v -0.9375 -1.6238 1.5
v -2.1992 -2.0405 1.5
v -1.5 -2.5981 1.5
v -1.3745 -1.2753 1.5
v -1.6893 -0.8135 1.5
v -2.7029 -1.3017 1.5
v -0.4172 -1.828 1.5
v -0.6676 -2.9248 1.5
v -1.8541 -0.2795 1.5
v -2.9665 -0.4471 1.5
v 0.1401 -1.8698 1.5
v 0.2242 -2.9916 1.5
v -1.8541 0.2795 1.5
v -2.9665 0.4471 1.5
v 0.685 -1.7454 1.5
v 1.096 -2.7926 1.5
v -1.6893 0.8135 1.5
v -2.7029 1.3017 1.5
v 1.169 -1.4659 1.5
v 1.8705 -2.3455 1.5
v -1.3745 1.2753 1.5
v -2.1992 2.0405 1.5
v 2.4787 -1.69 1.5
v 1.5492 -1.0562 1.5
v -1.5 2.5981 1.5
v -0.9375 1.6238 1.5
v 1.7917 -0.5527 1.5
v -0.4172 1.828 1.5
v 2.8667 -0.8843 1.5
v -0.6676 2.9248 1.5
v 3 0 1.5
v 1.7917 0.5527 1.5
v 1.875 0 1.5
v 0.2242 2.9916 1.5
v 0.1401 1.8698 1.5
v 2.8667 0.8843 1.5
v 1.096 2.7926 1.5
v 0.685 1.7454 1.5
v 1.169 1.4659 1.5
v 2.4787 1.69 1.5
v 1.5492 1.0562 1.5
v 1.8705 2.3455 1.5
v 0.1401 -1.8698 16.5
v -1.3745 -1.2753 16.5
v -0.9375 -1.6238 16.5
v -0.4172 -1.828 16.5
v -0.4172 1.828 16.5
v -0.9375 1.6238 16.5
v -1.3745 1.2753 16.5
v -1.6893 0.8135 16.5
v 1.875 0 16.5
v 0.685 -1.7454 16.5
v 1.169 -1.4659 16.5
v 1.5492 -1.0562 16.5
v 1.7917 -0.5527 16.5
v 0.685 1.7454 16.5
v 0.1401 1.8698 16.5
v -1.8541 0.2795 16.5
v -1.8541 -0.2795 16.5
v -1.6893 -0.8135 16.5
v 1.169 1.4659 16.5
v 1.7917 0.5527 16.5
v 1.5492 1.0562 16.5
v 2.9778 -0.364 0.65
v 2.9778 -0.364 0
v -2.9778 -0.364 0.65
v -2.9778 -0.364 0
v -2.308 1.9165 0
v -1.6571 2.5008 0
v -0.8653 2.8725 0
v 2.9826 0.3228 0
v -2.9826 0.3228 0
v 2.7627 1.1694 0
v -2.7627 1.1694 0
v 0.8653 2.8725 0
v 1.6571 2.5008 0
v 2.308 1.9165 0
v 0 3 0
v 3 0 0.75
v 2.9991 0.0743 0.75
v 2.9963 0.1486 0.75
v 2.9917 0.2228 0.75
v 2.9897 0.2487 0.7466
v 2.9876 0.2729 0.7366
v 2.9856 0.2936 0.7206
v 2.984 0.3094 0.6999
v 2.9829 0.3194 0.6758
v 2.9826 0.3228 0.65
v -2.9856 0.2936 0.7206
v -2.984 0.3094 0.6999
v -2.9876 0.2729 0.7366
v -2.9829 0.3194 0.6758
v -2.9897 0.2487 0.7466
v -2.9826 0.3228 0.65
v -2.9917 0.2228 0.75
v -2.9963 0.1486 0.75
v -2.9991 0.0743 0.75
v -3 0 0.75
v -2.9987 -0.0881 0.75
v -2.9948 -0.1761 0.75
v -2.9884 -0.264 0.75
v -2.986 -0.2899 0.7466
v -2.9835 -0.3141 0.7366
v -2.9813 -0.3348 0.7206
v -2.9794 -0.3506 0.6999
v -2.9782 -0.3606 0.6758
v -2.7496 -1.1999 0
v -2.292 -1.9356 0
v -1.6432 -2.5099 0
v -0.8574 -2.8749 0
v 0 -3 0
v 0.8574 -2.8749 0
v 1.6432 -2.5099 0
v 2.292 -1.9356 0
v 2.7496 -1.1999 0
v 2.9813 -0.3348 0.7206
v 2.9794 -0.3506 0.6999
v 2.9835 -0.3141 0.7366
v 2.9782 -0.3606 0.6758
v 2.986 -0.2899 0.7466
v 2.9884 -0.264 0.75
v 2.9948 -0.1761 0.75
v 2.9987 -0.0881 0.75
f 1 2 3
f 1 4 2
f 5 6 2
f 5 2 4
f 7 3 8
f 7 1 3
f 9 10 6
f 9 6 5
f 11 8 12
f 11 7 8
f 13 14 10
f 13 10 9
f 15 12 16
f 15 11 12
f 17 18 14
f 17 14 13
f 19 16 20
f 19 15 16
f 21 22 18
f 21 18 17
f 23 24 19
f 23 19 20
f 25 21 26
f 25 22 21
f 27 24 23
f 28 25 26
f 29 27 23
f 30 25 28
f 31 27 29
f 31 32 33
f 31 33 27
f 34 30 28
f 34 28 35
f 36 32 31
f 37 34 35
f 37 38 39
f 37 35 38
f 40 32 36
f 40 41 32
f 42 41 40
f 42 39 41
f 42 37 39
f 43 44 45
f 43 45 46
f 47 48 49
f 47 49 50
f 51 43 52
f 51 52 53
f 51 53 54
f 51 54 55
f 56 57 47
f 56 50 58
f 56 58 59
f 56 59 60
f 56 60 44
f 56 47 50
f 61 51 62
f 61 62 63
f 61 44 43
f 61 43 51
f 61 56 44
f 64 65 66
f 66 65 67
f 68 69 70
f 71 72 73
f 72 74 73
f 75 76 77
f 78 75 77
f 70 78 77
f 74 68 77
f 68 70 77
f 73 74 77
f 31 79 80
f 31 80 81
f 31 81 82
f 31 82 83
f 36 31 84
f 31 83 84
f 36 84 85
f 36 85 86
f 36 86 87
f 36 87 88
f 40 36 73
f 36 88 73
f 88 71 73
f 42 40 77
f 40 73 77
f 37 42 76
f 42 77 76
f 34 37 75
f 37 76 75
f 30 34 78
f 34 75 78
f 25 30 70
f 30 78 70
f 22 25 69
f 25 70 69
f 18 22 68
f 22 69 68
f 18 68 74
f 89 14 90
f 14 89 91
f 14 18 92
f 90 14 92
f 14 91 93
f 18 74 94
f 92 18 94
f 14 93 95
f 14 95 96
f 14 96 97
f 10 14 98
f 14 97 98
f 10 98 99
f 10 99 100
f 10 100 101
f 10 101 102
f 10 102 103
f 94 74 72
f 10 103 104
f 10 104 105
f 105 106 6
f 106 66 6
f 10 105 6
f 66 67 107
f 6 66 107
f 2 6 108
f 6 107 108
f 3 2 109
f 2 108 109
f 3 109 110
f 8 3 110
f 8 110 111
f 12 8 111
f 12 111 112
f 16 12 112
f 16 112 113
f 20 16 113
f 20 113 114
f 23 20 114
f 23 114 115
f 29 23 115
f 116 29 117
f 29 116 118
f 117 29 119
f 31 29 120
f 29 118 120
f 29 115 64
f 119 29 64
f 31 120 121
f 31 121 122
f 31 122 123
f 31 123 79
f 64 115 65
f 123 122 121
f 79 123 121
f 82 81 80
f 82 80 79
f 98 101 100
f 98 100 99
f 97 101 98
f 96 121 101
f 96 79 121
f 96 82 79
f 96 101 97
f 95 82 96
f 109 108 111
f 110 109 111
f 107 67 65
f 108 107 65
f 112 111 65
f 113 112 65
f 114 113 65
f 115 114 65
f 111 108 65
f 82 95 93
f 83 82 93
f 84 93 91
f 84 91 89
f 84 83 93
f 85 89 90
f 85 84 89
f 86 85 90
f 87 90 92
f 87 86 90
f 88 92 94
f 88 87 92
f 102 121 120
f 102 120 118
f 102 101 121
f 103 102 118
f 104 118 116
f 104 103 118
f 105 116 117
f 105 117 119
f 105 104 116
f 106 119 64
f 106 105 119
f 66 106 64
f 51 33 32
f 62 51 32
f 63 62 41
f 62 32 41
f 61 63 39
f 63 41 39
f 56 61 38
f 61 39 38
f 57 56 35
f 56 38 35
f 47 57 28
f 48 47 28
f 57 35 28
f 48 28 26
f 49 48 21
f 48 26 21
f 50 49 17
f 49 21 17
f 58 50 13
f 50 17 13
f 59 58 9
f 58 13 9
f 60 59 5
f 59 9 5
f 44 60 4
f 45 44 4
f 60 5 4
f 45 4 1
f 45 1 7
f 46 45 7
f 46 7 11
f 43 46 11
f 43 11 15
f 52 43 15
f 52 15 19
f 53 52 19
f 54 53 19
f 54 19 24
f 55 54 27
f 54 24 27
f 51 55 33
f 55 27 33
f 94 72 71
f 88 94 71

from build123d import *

# Parameters (mm, degrees)
SKETCH1_R           = 3
BOSS_EXTRUDE1_DEPTH = 1.5
SKETCH2_R           = 1.875
BOSS_EXTRUDE2_DEPTH = 15
CUT_EXTRUDE1_DEPTH  = 0.75
FILLET2_R           = 0.1


with BuildPart() as part:
    # Sketch1 → Boss-Extrude1 (new body)
    with BuildSketch(Plane.XY):
        Circle(SKETCH1_R)
    extrude(amount=BOSS_EXTRUDE1_DEPTH)

    # Sketch2 → Boss-Extrude2 (add)
    with BuildSketch(Plane.XY.offset(1.5)):
        Circle(SKETCH2_R)
    extrude(amount=BOSS_EXTRUDE2_DEPTH)

    # Sketch3 → Cut-Extrude1 (cut)
    with BuildSketch(Plane(origin=(0, 0, 0), x_dir=(-1, 0, 0), z_dir=(0, 0, -1))):
        with BuildLine():
            Line((2.977836652, 0.322793516), (-2.982583502, 0.322793516))
            ThreePointArc((-2.982583502, 0.322793516), (-3, 0), (-2.982583502, -0.322793516))
            ThreePointArc((-2.982583502, -0.322793516), (-2.980281261, -0.343400064), (-2.977836652, -0.363990208))
            Line((-2.977836652, -0.363990208), (2.977836652, -0.363990208))
            ThreePointArc((2.977836652, -0.363990208), (2.994454037, -0.182332173), (3, 0))
            ThreePointArc((3, 0), (2.995642711, 0.161631516), (2.982583502, 0.322793516))
            Line((2.982583502, 0.322793516), (2.977836652, 0.322793516))
        make_face()
    extrude(amount=-CUT_EXTRUDE1_DEPTH, mode=Mode.SUBTRACT)

    # Fillet2
    fillet2_edges = [part.edges().sort_by_distance(p)[0] for p in [
        (0, -0.363990208, 0.75),
        (0, 0.322793516, 0.75),
    ]]
    fillet(fillet2_edges, radius=FILLET2_R)


solid = part.part
